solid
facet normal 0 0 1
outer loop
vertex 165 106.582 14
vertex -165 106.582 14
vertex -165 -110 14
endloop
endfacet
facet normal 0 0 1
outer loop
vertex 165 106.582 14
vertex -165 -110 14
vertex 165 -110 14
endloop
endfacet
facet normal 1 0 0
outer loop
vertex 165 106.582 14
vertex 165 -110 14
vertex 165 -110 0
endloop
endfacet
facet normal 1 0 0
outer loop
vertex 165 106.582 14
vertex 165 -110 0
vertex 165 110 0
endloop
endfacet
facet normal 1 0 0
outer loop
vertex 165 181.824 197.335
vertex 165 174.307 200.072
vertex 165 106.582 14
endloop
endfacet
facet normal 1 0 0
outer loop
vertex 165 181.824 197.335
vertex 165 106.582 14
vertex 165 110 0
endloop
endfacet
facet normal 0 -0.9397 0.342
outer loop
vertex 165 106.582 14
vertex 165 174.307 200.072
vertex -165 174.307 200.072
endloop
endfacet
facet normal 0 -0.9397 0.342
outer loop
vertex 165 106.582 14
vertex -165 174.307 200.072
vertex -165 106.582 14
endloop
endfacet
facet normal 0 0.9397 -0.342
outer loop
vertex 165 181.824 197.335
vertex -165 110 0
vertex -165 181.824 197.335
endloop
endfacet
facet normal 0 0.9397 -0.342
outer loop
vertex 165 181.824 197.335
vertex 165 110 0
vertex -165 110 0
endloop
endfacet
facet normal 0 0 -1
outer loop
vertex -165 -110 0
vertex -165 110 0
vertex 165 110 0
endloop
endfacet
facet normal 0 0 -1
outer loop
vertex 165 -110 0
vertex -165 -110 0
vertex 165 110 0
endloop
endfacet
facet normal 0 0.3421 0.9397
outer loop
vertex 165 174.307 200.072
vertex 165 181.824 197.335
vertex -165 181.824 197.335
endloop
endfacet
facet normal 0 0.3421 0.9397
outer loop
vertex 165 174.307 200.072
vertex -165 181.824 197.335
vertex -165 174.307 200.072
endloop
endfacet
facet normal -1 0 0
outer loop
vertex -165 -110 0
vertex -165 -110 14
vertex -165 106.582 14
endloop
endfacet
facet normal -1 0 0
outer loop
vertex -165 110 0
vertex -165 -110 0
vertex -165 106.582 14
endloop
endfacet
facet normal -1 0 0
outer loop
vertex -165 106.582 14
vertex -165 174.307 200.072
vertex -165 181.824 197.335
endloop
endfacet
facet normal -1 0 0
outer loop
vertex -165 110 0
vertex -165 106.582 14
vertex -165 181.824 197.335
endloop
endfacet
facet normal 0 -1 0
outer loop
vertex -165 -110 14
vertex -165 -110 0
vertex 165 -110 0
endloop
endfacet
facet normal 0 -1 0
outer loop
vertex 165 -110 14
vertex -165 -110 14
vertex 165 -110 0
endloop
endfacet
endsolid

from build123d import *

# Parameters (mm, degrees)
SKETCH_W     = 330
SKETCH_H     = 220
PAD_DEPTH    = 14
PAD001_DEPTH = 165


with BuildPart() as part:
    # Sketch → Pad (new body)
    with BuildSketch(Plane.XY):
        Rectangle(SKETCH_W, SKETCH_H)
    extrude(amount=PAD_DEPTH)

    # Sketch001 → Pad001 (join, symmetric)
    with BuildSketch(Plane.YZ):
        Polygon((110, 0), (181.824324, 197.335416), (174.306784, 200.071581), (102.48246, 2.736165), align=None)
    extrude(amount=PAD001_DEPTH, both=True)


solid = part.part
